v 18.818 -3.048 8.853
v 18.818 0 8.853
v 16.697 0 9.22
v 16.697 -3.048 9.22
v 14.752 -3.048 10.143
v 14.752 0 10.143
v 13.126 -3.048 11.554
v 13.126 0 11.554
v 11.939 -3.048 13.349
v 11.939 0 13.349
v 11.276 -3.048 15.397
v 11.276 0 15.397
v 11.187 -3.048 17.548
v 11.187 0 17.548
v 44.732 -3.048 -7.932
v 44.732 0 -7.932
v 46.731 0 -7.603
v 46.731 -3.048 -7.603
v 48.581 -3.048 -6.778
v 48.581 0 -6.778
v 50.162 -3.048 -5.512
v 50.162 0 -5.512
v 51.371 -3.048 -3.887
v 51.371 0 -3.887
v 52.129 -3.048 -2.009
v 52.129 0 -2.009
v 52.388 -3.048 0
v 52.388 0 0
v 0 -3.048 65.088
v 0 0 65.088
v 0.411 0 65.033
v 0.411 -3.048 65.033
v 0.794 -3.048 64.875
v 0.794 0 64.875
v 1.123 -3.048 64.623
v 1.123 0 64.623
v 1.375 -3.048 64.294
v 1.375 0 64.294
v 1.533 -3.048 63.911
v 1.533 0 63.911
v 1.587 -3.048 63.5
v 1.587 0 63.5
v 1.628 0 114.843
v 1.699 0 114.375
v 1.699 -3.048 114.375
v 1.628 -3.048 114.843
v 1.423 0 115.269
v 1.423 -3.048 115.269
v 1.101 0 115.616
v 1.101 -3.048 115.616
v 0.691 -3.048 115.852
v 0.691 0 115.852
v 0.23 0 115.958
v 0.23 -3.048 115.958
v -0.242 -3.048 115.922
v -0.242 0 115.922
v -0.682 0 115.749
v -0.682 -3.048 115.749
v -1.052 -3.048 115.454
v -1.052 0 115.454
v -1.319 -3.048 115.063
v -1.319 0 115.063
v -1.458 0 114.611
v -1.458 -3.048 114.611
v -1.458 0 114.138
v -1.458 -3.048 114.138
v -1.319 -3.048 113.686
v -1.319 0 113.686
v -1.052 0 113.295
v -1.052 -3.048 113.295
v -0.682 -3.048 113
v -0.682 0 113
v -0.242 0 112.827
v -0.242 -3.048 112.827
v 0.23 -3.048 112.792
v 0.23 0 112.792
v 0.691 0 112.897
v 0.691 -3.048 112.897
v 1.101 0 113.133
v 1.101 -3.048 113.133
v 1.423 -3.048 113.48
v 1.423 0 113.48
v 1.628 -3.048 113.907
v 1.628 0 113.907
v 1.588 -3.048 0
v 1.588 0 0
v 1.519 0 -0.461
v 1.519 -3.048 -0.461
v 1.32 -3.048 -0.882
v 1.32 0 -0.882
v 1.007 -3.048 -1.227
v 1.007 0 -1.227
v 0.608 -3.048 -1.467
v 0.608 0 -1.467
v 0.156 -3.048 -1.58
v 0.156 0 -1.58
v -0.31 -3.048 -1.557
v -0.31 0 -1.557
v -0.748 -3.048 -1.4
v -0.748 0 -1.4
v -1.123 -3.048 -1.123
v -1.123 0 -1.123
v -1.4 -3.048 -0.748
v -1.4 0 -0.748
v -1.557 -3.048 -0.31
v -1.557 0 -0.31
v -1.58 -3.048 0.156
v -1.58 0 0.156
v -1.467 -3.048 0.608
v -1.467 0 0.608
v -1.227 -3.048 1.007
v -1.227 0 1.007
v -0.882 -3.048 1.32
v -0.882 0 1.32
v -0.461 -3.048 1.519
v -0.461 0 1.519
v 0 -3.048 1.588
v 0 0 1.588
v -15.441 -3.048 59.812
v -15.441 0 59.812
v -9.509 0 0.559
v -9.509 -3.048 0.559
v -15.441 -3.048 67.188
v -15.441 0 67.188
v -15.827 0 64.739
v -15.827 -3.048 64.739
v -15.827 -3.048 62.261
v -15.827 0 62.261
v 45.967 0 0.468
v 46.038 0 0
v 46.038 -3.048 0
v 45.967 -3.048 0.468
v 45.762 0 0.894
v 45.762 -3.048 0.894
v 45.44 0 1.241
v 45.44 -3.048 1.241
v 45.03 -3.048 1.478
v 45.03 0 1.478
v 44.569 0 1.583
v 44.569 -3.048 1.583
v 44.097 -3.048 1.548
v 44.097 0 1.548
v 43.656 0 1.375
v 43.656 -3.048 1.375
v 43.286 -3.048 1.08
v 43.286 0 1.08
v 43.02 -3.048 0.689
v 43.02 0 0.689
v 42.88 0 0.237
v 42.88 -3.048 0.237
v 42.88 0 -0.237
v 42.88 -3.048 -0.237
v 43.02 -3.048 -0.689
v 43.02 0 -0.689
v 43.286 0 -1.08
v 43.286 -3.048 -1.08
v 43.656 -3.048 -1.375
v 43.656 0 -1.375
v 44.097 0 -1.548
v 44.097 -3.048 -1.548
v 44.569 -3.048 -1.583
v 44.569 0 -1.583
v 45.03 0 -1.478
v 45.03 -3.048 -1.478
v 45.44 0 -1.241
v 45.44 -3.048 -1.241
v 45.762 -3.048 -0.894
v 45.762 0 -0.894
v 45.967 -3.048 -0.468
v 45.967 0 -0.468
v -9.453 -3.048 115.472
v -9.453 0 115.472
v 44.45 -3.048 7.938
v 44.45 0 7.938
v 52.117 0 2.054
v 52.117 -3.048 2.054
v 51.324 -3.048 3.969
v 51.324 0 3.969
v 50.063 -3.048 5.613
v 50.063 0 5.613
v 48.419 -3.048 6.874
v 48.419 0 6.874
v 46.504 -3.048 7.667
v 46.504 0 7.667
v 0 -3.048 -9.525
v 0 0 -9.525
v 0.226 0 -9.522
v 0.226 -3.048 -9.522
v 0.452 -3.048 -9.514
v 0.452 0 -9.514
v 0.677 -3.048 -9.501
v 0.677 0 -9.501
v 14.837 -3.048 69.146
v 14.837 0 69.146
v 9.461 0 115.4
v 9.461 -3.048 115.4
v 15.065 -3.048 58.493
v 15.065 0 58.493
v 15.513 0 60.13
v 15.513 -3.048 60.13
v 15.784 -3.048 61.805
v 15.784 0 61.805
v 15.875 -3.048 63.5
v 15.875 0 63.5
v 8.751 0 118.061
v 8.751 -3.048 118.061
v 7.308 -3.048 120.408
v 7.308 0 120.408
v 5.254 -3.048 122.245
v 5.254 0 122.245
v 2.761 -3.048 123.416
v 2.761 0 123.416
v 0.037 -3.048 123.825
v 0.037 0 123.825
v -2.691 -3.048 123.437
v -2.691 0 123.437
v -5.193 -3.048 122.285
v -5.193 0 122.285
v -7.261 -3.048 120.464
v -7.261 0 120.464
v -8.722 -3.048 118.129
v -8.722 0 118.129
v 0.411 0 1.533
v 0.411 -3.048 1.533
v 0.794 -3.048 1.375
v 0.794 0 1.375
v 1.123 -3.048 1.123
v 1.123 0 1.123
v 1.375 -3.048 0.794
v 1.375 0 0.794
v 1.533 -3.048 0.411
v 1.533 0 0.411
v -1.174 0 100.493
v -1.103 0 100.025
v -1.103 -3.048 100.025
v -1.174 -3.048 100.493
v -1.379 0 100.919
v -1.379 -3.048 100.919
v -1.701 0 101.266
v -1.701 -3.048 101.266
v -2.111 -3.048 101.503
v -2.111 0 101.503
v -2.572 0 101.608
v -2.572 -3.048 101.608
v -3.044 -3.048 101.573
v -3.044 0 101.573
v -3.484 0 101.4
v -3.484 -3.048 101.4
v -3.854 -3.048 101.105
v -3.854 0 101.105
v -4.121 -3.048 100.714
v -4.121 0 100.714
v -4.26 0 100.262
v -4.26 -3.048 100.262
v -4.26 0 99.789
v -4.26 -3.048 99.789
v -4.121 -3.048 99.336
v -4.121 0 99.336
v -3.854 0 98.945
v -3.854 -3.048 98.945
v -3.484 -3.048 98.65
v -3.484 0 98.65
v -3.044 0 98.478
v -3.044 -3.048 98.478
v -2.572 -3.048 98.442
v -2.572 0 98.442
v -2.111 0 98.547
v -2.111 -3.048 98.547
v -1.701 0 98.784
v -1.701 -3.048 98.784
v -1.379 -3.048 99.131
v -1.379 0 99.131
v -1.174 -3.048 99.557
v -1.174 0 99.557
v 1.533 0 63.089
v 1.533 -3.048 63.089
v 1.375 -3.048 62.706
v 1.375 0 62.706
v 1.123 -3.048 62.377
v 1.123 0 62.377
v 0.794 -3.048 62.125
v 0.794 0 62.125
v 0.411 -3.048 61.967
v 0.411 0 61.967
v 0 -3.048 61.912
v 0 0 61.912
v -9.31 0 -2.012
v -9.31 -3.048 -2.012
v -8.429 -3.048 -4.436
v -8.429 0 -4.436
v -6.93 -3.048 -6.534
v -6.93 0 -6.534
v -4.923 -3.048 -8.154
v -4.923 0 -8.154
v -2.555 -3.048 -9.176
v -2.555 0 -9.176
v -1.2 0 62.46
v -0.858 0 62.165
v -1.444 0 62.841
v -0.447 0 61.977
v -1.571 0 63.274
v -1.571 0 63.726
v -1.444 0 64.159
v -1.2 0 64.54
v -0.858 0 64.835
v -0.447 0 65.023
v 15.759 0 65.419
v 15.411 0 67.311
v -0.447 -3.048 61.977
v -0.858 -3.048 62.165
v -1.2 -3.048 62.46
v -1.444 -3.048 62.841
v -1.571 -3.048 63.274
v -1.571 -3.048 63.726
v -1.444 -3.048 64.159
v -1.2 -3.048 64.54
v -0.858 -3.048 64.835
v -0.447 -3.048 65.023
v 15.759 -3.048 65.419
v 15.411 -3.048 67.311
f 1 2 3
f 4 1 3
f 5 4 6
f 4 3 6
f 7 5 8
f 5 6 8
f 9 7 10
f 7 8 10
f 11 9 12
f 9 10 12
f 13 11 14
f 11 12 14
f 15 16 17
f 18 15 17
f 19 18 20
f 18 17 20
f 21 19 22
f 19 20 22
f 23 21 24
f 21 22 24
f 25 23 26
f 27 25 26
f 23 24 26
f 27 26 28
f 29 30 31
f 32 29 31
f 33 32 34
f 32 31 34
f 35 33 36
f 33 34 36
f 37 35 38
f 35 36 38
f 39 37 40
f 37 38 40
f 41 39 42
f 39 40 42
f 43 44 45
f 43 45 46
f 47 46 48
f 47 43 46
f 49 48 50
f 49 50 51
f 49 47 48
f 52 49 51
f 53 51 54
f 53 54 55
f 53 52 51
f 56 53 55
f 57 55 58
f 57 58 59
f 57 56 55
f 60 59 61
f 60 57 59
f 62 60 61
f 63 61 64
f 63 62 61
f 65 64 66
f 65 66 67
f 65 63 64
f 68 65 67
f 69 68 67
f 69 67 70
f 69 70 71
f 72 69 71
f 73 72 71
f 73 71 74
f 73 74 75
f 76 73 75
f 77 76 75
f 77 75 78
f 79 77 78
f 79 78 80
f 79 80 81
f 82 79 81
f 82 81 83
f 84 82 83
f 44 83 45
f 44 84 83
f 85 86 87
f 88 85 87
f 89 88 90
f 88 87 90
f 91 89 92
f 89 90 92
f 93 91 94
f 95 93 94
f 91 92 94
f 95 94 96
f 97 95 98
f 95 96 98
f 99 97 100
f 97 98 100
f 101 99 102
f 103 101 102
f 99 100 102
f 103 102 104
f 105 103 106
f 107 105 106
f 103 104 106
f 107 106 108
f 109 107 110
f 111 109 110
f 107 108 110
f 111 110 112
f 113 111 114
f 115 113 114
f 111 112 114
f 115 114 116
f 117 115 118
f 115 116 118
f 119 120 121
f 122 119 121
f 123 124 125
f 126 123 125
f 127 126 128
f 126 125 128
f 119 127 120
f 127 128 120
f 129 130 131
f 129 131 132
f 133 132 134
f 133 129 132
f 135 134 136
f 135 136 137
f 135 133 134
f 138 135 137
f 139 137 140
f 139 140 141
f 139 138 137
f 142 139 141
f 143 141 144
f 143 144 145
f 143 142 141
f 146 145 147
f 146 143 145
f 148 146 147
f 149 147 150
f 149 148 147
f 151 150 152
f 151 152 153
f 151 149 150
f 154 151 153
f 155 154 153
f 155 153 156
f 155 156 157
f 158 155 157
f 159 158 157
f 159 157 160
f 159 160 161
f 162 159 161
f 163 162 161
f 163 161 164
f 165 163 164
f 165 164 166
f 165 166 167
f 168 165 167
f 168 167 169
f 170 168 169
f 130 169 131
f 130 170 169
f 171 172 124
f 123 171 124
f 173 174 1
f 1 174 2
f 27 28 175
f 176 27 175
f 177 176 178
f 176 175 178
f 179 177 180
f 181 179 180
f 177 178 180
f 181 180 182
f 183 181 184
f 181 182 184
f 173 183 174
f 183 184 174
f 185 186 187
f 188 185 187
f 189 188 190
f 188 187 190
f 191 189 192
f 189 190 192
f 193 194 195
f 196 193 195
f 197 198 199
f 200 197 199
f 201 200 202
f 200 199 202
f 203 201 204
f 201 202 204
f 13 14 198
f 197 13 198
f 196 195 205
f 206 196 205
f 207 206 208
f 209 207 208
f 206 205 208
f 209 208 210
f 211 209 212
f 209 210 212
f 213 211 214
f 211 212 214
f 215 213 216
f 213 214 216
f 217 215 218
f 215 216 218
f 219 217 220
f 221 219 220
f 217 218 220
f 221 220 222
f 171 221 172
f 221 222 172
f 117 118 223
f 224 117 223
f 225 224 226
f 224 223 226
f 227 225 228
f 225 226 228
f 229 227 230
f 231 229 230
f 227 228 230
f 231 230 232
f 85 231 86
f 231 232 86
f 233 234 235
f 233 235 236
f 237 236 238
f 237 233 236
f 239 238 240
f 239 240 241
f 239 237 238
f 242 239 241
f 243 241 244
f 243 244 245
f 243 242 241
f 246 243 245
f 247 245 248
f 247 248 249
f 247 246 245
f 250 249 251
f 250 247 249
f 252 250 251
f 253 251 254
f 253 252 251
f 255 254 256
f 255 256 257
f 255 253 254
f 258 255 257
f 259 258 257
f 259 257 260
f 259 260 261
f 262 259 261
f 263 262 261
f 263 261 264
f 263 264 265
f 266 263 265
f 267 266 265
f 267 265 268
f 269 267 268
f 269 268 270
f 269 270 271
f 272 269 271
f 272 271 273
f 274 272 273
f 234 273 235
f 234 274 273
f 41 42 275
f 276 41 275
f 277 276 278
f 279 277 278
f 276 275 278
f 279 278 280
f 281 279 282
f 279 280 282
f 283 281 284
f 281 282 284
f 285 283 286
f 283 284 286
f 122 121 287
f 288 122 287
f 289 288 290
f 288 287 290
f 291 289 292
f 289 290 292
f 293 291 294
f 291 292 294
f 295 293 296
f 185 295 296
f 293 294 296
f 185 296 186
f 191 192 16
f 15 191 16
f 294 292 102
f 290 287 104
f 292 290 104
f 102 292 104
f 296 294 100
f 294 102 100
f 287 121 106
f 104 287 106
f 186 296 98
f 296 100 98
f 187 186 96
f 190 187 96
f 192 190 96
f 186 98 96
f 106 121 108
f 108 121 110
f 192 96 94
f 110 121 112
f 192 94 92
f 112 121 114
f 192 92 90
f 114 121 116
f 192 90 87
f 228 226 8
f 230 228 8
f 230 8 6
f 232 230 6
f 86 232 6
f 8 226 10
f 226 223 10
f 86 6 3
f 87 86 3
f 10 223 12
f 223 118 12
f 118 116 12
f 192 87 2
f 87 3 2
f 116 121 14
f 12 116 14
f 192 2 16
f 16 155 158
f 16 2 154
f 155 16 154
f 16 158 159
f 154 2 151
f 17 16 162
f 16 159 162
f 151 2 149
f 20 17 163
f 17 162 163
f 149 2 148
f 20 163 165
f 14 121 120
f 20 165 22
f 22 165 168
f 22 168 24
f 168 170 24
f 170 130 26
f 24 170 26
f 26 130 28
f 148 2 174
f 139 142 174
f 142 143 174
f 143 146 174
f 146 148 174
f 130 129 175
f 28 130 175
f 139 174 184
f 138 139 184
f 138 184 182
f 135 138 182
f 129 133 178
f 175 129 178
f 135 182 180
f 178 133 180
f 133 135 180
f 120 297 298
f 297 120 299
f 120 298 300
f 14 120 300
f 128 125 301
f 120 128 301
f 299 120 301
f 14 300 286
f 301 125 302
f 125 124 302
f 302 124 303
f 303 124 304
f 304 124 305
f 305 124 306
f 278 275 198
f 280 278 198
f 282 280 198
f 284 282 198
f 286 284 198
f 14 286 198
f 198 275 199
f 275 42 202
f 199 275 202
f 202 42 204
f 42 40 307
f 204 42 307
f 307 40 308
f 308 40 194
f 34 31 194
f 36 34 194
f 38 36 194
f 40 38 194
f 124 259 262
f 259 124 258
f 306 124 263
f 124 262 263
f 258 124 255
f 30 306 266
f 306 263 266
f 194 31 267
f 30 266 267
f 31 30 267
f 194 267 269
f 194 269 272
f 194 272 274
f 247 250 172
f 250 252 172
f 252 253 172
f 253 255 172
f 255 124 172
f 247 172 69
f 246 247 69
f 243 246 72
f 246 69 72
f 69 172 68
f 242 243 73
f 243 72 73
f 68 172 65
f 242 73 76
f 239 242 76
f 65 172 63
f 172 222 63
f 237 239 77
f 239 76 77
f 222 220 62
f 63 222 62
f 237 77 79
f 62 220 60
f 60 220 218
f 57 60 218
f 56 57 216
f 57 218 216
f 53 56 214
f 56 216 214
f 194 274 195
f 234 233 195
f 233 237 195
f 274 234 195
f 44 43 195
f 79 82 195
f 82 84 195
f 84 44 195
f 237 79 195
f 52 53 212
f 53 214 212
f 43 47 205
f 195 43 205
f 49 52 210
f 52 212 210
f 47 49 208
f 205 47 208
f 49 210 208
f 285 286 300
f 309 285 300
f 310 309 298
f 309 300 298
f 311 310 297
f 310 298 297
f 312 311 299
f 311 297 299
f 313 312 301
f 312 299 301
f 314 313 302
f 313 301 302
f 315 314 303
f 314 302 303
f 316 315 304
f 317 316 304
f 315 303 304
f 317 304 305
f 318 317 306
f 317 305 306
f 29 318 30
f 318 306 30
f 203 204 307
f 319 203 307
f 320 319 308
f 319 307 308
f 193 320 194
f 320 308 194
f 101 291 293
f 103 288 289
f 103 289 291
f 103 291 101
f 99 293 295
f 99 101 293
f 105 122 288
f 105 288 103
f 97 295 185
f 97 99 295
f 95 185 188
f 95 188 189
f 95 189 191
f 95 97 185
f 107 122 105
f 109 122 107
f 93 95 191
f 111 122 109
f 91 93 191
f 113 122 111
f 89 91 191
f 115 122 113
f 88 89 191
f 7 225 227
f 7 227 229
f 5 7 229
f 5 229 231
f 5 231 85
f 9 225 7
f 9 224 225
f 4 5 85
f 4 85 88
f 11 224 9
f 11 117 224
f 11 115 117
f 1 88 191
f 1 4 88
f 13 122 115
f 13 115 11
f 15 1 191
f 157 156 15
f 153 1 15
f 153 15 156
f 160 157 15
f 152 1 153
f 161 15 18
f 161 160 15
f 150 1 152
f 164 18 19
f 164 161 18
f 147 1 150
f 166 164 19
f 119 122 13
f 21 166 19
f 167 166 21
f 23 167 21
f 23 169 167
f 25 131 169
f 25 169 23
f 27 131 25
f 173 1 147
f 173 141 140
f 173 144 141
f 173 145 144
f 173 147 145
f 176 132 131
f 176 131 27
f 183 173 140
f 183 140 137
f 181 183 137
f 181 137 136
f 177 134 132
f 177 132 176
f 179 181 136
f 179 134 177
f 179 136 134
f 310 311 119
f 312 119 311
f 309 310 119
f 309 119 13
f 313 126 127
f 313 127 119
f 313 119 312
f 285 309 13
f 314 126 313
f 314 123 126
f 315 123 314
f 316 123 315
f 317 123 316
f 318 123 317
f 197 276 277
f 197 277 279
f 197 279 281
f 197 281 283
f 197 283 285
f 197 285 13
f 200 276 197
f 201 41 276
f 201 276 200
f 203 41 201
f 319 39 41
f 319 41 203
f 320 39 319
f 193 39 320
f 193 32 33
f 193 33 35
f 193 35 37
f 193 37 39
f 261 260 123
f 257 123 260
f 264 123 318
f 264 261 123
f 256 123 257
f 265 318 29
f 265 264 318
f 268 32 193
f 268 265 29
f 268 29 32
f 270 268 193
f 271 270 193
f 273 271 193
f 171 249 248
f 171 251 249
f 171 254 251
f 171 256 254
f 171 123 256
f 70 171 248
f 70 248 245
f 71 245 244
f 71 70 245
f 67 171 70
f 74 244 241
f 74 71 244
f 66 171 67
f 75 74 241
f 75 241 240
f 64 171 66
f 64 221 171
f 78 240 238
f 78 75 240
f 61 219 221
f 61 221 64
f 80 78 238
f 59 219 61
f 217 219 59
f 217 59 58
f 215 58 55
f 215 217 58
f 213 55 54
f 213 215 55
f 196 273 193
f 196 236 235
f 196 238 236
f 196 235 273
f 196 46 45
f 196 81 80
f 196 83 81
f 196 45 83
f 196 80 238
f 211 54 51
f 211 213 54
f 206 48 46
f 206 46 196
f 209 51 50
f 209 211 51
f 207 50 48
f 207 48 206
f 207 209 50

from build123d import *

# Parameters (mm, degrees)
F0_R     = 1.5875
F1_DEPTH = 3.048


with BuildPart() as f1:
    # F0 (on Front) → F1 (new body)
    with BuildSketch(Plane.XZ):
        with BuildLine():
            ThreePointArc((1.5875, 0), (1.122532, 1.122532), (0, 1.5875))
            ThreePointArc((0, 1.5875), (-1.122532, -1.122532), (1.5875, 0))
        make_face()
        with BuildLine():
            ThreePointArc((0.677344, -9.500886), (6.970557, -6.491299), (9.525, 0))
            ThreePointArc((9.525, 0), (6.735192, 6.735192), (0, 9.525))
            ThreePointArc((0, 9.525), (-6.534492, 6.930082), (-9.50857, 0.559208))
            ThreePointArc((-9.50857, 0.559208), (-6.930082, -6.534492), (0, -9.525))
            Line((0, -9.525), (0.677344, -9.500886))
        make_face()
        with BuildLine():
            ThreePointArc((1.5875, 0), (-1.122532, -1.122532), (0, 1.5875))
            ThreePointArc((0, 1.5875), (1.122532, 1.122532), (1.5875, 0))
        make_face(mode=Mode.SUBTRACT)
        with BuildLine():
            ThreePointArc((0, 9.525), (6.735192, 6.735192), (9.525, 0))
            ThreePointArc((9.525, 0), (6.970557, -6.491299), (0.677344, -9.500886))
            Line((0.677344, -9.500886), (44.732405, -7.932475))
            ThreePointArc((44.732405, -7.932475), (36.513756, -0.141225), (44.45, 7.9375))
            Line((44.45, 7.9375), (18.817909, 8.852932))
            ThreePointArc((18.817909, 8.852932), (13.12642, 11.553818), (11.18688, 17.547649))
            Line((11.18688, 17.547649), (15.064665, 58.492855))
            ThreePointArc((15.064665, 58.492855), (9.28782, 50.625528), (0, 47.625))
            Line((0, 47.625), (0, 9.525))
        make_face()
        with BuildLine():
            ThreePointArc((-9.50857, 0.559208), (-6.534492, 6.930082), (0, 9.525))
            Line((0, 9.525), (0, 47.625))
            ThreePointArc((0, 47.625), (-9.835501, 51.038918), (-15.440753, 59.812348))
            Line((-15.440753, 59.812348), (-9.50857, 0.559208))
        make_face()
        with BuildLine():
            ThreePointArc((0, -9.525), (0.338886, -9.51897), (0.677344, -9.500886))
            Line((0.677344, -9.500886), (0, -9.525))
        make_face()
        with BuildLine():
            Line((0, 61.9125), (0, 47.625))
            ThreePointArc((0, 47.625), (9.28782, 50.625528), (15.064665, 58.492855))
            ThreePointArc((15.064665, 58.492855), (15.671107, 60.963854), (15.875, 63.5))
            ThreePointArc((15.875, 63.5), (15.613359, 66.370305), (14.83706, 69.145998))
            ThreePointArc((14.83706, 69.145998), (9.0107, 76.569924), (0, 79.375))
            Line((0, 79.375), (0, 65.0875))
            ThreePointArc((0, 65.0875), (1.122532, 64.622532), (1.5875, 63.5))
            ThreePointArc((1.5875, 63.5), (1.122532, 62.377468), (0, 61.9125))
        make_face()
        with BuildLine():
            ThreePointArc((-15.440753, 59.812348), (-9.835501, 51.038918), (0, 47.625))
            Line((0, 47.625), (0, 61.9125))
            ThreePointArc((0, 61.9125), (-1.5875, 63.5), (0, 65.0875))
            Line((0, 65.0875), (0, 79.375))
            ThreePointArc((0, 79.375), (-9.835501, 75.961082), (-15.440753, 67.187652))
            ThreePointArc((-15.440753, 67.187652), (-15.875, 63.5), (-15.440753, 59.812348))
        make_face()
        with BuildLine():
            ThreePointArc((44.45, 7.9375), (36.513756, -0.141225), (44.732405, -7.932475))
            ThreePointArc((44.732405, -7.932475), (50.161633, -5.51191), (52.3875, 0))
            ThreePointArc((52.3875, 0), (50.06266, 5.61266), (44.45, 7.9375))
        make_face()
        with Locations((44.45, 0)):
            Circle(F0_R, mode=Mode.SUBTRACT)
        with BuildLine():
            Line((-9.452585, 115.472291), (-15.440753, 67.187652))
            ThreePointArc((-15.440753, 67.187652), (-9.835501, 75.961082), (0, 79.375))
            ThreePointArc((0, 79.375), (9.0107, 76.569924), (14.83706, 69.145998))
            Line((14.83706, 69.145998), (9.461313, 115.399625))
            ThreePointArc((9.461313, 115.399625), (9.509065, 114.850734), (9.525, 114.3))
            ThreePointArc((9.525, 114.3), (-0.587263, 104.793121), (-9.452585, 115.472291))
        make_face()
        with Locations((-2.690725, 100.0252)):
            Circle(F0_R, mode=Mode.SUBTRACT)
        with BuildLine():
            ThreePointArc((9.461313, 115.399625), (0.036594, 123.82493), (-9.452585, 115.472291))
            ThreePointArc((-9.452585, 115.472291), (-0.587263, 104.793121), (9.525, 114.3))
            ThreePointArc((9.525, 114.3), (9.509065, 114.850734), (9.461313, 115.399625))
        make_face()
        with Locations((0.111441, 114.374639)):
            Circle(F0_R, mode=Mode.SUBTRACT)
    extrude(amount=F1_DEPTH)


solid = f1.part
